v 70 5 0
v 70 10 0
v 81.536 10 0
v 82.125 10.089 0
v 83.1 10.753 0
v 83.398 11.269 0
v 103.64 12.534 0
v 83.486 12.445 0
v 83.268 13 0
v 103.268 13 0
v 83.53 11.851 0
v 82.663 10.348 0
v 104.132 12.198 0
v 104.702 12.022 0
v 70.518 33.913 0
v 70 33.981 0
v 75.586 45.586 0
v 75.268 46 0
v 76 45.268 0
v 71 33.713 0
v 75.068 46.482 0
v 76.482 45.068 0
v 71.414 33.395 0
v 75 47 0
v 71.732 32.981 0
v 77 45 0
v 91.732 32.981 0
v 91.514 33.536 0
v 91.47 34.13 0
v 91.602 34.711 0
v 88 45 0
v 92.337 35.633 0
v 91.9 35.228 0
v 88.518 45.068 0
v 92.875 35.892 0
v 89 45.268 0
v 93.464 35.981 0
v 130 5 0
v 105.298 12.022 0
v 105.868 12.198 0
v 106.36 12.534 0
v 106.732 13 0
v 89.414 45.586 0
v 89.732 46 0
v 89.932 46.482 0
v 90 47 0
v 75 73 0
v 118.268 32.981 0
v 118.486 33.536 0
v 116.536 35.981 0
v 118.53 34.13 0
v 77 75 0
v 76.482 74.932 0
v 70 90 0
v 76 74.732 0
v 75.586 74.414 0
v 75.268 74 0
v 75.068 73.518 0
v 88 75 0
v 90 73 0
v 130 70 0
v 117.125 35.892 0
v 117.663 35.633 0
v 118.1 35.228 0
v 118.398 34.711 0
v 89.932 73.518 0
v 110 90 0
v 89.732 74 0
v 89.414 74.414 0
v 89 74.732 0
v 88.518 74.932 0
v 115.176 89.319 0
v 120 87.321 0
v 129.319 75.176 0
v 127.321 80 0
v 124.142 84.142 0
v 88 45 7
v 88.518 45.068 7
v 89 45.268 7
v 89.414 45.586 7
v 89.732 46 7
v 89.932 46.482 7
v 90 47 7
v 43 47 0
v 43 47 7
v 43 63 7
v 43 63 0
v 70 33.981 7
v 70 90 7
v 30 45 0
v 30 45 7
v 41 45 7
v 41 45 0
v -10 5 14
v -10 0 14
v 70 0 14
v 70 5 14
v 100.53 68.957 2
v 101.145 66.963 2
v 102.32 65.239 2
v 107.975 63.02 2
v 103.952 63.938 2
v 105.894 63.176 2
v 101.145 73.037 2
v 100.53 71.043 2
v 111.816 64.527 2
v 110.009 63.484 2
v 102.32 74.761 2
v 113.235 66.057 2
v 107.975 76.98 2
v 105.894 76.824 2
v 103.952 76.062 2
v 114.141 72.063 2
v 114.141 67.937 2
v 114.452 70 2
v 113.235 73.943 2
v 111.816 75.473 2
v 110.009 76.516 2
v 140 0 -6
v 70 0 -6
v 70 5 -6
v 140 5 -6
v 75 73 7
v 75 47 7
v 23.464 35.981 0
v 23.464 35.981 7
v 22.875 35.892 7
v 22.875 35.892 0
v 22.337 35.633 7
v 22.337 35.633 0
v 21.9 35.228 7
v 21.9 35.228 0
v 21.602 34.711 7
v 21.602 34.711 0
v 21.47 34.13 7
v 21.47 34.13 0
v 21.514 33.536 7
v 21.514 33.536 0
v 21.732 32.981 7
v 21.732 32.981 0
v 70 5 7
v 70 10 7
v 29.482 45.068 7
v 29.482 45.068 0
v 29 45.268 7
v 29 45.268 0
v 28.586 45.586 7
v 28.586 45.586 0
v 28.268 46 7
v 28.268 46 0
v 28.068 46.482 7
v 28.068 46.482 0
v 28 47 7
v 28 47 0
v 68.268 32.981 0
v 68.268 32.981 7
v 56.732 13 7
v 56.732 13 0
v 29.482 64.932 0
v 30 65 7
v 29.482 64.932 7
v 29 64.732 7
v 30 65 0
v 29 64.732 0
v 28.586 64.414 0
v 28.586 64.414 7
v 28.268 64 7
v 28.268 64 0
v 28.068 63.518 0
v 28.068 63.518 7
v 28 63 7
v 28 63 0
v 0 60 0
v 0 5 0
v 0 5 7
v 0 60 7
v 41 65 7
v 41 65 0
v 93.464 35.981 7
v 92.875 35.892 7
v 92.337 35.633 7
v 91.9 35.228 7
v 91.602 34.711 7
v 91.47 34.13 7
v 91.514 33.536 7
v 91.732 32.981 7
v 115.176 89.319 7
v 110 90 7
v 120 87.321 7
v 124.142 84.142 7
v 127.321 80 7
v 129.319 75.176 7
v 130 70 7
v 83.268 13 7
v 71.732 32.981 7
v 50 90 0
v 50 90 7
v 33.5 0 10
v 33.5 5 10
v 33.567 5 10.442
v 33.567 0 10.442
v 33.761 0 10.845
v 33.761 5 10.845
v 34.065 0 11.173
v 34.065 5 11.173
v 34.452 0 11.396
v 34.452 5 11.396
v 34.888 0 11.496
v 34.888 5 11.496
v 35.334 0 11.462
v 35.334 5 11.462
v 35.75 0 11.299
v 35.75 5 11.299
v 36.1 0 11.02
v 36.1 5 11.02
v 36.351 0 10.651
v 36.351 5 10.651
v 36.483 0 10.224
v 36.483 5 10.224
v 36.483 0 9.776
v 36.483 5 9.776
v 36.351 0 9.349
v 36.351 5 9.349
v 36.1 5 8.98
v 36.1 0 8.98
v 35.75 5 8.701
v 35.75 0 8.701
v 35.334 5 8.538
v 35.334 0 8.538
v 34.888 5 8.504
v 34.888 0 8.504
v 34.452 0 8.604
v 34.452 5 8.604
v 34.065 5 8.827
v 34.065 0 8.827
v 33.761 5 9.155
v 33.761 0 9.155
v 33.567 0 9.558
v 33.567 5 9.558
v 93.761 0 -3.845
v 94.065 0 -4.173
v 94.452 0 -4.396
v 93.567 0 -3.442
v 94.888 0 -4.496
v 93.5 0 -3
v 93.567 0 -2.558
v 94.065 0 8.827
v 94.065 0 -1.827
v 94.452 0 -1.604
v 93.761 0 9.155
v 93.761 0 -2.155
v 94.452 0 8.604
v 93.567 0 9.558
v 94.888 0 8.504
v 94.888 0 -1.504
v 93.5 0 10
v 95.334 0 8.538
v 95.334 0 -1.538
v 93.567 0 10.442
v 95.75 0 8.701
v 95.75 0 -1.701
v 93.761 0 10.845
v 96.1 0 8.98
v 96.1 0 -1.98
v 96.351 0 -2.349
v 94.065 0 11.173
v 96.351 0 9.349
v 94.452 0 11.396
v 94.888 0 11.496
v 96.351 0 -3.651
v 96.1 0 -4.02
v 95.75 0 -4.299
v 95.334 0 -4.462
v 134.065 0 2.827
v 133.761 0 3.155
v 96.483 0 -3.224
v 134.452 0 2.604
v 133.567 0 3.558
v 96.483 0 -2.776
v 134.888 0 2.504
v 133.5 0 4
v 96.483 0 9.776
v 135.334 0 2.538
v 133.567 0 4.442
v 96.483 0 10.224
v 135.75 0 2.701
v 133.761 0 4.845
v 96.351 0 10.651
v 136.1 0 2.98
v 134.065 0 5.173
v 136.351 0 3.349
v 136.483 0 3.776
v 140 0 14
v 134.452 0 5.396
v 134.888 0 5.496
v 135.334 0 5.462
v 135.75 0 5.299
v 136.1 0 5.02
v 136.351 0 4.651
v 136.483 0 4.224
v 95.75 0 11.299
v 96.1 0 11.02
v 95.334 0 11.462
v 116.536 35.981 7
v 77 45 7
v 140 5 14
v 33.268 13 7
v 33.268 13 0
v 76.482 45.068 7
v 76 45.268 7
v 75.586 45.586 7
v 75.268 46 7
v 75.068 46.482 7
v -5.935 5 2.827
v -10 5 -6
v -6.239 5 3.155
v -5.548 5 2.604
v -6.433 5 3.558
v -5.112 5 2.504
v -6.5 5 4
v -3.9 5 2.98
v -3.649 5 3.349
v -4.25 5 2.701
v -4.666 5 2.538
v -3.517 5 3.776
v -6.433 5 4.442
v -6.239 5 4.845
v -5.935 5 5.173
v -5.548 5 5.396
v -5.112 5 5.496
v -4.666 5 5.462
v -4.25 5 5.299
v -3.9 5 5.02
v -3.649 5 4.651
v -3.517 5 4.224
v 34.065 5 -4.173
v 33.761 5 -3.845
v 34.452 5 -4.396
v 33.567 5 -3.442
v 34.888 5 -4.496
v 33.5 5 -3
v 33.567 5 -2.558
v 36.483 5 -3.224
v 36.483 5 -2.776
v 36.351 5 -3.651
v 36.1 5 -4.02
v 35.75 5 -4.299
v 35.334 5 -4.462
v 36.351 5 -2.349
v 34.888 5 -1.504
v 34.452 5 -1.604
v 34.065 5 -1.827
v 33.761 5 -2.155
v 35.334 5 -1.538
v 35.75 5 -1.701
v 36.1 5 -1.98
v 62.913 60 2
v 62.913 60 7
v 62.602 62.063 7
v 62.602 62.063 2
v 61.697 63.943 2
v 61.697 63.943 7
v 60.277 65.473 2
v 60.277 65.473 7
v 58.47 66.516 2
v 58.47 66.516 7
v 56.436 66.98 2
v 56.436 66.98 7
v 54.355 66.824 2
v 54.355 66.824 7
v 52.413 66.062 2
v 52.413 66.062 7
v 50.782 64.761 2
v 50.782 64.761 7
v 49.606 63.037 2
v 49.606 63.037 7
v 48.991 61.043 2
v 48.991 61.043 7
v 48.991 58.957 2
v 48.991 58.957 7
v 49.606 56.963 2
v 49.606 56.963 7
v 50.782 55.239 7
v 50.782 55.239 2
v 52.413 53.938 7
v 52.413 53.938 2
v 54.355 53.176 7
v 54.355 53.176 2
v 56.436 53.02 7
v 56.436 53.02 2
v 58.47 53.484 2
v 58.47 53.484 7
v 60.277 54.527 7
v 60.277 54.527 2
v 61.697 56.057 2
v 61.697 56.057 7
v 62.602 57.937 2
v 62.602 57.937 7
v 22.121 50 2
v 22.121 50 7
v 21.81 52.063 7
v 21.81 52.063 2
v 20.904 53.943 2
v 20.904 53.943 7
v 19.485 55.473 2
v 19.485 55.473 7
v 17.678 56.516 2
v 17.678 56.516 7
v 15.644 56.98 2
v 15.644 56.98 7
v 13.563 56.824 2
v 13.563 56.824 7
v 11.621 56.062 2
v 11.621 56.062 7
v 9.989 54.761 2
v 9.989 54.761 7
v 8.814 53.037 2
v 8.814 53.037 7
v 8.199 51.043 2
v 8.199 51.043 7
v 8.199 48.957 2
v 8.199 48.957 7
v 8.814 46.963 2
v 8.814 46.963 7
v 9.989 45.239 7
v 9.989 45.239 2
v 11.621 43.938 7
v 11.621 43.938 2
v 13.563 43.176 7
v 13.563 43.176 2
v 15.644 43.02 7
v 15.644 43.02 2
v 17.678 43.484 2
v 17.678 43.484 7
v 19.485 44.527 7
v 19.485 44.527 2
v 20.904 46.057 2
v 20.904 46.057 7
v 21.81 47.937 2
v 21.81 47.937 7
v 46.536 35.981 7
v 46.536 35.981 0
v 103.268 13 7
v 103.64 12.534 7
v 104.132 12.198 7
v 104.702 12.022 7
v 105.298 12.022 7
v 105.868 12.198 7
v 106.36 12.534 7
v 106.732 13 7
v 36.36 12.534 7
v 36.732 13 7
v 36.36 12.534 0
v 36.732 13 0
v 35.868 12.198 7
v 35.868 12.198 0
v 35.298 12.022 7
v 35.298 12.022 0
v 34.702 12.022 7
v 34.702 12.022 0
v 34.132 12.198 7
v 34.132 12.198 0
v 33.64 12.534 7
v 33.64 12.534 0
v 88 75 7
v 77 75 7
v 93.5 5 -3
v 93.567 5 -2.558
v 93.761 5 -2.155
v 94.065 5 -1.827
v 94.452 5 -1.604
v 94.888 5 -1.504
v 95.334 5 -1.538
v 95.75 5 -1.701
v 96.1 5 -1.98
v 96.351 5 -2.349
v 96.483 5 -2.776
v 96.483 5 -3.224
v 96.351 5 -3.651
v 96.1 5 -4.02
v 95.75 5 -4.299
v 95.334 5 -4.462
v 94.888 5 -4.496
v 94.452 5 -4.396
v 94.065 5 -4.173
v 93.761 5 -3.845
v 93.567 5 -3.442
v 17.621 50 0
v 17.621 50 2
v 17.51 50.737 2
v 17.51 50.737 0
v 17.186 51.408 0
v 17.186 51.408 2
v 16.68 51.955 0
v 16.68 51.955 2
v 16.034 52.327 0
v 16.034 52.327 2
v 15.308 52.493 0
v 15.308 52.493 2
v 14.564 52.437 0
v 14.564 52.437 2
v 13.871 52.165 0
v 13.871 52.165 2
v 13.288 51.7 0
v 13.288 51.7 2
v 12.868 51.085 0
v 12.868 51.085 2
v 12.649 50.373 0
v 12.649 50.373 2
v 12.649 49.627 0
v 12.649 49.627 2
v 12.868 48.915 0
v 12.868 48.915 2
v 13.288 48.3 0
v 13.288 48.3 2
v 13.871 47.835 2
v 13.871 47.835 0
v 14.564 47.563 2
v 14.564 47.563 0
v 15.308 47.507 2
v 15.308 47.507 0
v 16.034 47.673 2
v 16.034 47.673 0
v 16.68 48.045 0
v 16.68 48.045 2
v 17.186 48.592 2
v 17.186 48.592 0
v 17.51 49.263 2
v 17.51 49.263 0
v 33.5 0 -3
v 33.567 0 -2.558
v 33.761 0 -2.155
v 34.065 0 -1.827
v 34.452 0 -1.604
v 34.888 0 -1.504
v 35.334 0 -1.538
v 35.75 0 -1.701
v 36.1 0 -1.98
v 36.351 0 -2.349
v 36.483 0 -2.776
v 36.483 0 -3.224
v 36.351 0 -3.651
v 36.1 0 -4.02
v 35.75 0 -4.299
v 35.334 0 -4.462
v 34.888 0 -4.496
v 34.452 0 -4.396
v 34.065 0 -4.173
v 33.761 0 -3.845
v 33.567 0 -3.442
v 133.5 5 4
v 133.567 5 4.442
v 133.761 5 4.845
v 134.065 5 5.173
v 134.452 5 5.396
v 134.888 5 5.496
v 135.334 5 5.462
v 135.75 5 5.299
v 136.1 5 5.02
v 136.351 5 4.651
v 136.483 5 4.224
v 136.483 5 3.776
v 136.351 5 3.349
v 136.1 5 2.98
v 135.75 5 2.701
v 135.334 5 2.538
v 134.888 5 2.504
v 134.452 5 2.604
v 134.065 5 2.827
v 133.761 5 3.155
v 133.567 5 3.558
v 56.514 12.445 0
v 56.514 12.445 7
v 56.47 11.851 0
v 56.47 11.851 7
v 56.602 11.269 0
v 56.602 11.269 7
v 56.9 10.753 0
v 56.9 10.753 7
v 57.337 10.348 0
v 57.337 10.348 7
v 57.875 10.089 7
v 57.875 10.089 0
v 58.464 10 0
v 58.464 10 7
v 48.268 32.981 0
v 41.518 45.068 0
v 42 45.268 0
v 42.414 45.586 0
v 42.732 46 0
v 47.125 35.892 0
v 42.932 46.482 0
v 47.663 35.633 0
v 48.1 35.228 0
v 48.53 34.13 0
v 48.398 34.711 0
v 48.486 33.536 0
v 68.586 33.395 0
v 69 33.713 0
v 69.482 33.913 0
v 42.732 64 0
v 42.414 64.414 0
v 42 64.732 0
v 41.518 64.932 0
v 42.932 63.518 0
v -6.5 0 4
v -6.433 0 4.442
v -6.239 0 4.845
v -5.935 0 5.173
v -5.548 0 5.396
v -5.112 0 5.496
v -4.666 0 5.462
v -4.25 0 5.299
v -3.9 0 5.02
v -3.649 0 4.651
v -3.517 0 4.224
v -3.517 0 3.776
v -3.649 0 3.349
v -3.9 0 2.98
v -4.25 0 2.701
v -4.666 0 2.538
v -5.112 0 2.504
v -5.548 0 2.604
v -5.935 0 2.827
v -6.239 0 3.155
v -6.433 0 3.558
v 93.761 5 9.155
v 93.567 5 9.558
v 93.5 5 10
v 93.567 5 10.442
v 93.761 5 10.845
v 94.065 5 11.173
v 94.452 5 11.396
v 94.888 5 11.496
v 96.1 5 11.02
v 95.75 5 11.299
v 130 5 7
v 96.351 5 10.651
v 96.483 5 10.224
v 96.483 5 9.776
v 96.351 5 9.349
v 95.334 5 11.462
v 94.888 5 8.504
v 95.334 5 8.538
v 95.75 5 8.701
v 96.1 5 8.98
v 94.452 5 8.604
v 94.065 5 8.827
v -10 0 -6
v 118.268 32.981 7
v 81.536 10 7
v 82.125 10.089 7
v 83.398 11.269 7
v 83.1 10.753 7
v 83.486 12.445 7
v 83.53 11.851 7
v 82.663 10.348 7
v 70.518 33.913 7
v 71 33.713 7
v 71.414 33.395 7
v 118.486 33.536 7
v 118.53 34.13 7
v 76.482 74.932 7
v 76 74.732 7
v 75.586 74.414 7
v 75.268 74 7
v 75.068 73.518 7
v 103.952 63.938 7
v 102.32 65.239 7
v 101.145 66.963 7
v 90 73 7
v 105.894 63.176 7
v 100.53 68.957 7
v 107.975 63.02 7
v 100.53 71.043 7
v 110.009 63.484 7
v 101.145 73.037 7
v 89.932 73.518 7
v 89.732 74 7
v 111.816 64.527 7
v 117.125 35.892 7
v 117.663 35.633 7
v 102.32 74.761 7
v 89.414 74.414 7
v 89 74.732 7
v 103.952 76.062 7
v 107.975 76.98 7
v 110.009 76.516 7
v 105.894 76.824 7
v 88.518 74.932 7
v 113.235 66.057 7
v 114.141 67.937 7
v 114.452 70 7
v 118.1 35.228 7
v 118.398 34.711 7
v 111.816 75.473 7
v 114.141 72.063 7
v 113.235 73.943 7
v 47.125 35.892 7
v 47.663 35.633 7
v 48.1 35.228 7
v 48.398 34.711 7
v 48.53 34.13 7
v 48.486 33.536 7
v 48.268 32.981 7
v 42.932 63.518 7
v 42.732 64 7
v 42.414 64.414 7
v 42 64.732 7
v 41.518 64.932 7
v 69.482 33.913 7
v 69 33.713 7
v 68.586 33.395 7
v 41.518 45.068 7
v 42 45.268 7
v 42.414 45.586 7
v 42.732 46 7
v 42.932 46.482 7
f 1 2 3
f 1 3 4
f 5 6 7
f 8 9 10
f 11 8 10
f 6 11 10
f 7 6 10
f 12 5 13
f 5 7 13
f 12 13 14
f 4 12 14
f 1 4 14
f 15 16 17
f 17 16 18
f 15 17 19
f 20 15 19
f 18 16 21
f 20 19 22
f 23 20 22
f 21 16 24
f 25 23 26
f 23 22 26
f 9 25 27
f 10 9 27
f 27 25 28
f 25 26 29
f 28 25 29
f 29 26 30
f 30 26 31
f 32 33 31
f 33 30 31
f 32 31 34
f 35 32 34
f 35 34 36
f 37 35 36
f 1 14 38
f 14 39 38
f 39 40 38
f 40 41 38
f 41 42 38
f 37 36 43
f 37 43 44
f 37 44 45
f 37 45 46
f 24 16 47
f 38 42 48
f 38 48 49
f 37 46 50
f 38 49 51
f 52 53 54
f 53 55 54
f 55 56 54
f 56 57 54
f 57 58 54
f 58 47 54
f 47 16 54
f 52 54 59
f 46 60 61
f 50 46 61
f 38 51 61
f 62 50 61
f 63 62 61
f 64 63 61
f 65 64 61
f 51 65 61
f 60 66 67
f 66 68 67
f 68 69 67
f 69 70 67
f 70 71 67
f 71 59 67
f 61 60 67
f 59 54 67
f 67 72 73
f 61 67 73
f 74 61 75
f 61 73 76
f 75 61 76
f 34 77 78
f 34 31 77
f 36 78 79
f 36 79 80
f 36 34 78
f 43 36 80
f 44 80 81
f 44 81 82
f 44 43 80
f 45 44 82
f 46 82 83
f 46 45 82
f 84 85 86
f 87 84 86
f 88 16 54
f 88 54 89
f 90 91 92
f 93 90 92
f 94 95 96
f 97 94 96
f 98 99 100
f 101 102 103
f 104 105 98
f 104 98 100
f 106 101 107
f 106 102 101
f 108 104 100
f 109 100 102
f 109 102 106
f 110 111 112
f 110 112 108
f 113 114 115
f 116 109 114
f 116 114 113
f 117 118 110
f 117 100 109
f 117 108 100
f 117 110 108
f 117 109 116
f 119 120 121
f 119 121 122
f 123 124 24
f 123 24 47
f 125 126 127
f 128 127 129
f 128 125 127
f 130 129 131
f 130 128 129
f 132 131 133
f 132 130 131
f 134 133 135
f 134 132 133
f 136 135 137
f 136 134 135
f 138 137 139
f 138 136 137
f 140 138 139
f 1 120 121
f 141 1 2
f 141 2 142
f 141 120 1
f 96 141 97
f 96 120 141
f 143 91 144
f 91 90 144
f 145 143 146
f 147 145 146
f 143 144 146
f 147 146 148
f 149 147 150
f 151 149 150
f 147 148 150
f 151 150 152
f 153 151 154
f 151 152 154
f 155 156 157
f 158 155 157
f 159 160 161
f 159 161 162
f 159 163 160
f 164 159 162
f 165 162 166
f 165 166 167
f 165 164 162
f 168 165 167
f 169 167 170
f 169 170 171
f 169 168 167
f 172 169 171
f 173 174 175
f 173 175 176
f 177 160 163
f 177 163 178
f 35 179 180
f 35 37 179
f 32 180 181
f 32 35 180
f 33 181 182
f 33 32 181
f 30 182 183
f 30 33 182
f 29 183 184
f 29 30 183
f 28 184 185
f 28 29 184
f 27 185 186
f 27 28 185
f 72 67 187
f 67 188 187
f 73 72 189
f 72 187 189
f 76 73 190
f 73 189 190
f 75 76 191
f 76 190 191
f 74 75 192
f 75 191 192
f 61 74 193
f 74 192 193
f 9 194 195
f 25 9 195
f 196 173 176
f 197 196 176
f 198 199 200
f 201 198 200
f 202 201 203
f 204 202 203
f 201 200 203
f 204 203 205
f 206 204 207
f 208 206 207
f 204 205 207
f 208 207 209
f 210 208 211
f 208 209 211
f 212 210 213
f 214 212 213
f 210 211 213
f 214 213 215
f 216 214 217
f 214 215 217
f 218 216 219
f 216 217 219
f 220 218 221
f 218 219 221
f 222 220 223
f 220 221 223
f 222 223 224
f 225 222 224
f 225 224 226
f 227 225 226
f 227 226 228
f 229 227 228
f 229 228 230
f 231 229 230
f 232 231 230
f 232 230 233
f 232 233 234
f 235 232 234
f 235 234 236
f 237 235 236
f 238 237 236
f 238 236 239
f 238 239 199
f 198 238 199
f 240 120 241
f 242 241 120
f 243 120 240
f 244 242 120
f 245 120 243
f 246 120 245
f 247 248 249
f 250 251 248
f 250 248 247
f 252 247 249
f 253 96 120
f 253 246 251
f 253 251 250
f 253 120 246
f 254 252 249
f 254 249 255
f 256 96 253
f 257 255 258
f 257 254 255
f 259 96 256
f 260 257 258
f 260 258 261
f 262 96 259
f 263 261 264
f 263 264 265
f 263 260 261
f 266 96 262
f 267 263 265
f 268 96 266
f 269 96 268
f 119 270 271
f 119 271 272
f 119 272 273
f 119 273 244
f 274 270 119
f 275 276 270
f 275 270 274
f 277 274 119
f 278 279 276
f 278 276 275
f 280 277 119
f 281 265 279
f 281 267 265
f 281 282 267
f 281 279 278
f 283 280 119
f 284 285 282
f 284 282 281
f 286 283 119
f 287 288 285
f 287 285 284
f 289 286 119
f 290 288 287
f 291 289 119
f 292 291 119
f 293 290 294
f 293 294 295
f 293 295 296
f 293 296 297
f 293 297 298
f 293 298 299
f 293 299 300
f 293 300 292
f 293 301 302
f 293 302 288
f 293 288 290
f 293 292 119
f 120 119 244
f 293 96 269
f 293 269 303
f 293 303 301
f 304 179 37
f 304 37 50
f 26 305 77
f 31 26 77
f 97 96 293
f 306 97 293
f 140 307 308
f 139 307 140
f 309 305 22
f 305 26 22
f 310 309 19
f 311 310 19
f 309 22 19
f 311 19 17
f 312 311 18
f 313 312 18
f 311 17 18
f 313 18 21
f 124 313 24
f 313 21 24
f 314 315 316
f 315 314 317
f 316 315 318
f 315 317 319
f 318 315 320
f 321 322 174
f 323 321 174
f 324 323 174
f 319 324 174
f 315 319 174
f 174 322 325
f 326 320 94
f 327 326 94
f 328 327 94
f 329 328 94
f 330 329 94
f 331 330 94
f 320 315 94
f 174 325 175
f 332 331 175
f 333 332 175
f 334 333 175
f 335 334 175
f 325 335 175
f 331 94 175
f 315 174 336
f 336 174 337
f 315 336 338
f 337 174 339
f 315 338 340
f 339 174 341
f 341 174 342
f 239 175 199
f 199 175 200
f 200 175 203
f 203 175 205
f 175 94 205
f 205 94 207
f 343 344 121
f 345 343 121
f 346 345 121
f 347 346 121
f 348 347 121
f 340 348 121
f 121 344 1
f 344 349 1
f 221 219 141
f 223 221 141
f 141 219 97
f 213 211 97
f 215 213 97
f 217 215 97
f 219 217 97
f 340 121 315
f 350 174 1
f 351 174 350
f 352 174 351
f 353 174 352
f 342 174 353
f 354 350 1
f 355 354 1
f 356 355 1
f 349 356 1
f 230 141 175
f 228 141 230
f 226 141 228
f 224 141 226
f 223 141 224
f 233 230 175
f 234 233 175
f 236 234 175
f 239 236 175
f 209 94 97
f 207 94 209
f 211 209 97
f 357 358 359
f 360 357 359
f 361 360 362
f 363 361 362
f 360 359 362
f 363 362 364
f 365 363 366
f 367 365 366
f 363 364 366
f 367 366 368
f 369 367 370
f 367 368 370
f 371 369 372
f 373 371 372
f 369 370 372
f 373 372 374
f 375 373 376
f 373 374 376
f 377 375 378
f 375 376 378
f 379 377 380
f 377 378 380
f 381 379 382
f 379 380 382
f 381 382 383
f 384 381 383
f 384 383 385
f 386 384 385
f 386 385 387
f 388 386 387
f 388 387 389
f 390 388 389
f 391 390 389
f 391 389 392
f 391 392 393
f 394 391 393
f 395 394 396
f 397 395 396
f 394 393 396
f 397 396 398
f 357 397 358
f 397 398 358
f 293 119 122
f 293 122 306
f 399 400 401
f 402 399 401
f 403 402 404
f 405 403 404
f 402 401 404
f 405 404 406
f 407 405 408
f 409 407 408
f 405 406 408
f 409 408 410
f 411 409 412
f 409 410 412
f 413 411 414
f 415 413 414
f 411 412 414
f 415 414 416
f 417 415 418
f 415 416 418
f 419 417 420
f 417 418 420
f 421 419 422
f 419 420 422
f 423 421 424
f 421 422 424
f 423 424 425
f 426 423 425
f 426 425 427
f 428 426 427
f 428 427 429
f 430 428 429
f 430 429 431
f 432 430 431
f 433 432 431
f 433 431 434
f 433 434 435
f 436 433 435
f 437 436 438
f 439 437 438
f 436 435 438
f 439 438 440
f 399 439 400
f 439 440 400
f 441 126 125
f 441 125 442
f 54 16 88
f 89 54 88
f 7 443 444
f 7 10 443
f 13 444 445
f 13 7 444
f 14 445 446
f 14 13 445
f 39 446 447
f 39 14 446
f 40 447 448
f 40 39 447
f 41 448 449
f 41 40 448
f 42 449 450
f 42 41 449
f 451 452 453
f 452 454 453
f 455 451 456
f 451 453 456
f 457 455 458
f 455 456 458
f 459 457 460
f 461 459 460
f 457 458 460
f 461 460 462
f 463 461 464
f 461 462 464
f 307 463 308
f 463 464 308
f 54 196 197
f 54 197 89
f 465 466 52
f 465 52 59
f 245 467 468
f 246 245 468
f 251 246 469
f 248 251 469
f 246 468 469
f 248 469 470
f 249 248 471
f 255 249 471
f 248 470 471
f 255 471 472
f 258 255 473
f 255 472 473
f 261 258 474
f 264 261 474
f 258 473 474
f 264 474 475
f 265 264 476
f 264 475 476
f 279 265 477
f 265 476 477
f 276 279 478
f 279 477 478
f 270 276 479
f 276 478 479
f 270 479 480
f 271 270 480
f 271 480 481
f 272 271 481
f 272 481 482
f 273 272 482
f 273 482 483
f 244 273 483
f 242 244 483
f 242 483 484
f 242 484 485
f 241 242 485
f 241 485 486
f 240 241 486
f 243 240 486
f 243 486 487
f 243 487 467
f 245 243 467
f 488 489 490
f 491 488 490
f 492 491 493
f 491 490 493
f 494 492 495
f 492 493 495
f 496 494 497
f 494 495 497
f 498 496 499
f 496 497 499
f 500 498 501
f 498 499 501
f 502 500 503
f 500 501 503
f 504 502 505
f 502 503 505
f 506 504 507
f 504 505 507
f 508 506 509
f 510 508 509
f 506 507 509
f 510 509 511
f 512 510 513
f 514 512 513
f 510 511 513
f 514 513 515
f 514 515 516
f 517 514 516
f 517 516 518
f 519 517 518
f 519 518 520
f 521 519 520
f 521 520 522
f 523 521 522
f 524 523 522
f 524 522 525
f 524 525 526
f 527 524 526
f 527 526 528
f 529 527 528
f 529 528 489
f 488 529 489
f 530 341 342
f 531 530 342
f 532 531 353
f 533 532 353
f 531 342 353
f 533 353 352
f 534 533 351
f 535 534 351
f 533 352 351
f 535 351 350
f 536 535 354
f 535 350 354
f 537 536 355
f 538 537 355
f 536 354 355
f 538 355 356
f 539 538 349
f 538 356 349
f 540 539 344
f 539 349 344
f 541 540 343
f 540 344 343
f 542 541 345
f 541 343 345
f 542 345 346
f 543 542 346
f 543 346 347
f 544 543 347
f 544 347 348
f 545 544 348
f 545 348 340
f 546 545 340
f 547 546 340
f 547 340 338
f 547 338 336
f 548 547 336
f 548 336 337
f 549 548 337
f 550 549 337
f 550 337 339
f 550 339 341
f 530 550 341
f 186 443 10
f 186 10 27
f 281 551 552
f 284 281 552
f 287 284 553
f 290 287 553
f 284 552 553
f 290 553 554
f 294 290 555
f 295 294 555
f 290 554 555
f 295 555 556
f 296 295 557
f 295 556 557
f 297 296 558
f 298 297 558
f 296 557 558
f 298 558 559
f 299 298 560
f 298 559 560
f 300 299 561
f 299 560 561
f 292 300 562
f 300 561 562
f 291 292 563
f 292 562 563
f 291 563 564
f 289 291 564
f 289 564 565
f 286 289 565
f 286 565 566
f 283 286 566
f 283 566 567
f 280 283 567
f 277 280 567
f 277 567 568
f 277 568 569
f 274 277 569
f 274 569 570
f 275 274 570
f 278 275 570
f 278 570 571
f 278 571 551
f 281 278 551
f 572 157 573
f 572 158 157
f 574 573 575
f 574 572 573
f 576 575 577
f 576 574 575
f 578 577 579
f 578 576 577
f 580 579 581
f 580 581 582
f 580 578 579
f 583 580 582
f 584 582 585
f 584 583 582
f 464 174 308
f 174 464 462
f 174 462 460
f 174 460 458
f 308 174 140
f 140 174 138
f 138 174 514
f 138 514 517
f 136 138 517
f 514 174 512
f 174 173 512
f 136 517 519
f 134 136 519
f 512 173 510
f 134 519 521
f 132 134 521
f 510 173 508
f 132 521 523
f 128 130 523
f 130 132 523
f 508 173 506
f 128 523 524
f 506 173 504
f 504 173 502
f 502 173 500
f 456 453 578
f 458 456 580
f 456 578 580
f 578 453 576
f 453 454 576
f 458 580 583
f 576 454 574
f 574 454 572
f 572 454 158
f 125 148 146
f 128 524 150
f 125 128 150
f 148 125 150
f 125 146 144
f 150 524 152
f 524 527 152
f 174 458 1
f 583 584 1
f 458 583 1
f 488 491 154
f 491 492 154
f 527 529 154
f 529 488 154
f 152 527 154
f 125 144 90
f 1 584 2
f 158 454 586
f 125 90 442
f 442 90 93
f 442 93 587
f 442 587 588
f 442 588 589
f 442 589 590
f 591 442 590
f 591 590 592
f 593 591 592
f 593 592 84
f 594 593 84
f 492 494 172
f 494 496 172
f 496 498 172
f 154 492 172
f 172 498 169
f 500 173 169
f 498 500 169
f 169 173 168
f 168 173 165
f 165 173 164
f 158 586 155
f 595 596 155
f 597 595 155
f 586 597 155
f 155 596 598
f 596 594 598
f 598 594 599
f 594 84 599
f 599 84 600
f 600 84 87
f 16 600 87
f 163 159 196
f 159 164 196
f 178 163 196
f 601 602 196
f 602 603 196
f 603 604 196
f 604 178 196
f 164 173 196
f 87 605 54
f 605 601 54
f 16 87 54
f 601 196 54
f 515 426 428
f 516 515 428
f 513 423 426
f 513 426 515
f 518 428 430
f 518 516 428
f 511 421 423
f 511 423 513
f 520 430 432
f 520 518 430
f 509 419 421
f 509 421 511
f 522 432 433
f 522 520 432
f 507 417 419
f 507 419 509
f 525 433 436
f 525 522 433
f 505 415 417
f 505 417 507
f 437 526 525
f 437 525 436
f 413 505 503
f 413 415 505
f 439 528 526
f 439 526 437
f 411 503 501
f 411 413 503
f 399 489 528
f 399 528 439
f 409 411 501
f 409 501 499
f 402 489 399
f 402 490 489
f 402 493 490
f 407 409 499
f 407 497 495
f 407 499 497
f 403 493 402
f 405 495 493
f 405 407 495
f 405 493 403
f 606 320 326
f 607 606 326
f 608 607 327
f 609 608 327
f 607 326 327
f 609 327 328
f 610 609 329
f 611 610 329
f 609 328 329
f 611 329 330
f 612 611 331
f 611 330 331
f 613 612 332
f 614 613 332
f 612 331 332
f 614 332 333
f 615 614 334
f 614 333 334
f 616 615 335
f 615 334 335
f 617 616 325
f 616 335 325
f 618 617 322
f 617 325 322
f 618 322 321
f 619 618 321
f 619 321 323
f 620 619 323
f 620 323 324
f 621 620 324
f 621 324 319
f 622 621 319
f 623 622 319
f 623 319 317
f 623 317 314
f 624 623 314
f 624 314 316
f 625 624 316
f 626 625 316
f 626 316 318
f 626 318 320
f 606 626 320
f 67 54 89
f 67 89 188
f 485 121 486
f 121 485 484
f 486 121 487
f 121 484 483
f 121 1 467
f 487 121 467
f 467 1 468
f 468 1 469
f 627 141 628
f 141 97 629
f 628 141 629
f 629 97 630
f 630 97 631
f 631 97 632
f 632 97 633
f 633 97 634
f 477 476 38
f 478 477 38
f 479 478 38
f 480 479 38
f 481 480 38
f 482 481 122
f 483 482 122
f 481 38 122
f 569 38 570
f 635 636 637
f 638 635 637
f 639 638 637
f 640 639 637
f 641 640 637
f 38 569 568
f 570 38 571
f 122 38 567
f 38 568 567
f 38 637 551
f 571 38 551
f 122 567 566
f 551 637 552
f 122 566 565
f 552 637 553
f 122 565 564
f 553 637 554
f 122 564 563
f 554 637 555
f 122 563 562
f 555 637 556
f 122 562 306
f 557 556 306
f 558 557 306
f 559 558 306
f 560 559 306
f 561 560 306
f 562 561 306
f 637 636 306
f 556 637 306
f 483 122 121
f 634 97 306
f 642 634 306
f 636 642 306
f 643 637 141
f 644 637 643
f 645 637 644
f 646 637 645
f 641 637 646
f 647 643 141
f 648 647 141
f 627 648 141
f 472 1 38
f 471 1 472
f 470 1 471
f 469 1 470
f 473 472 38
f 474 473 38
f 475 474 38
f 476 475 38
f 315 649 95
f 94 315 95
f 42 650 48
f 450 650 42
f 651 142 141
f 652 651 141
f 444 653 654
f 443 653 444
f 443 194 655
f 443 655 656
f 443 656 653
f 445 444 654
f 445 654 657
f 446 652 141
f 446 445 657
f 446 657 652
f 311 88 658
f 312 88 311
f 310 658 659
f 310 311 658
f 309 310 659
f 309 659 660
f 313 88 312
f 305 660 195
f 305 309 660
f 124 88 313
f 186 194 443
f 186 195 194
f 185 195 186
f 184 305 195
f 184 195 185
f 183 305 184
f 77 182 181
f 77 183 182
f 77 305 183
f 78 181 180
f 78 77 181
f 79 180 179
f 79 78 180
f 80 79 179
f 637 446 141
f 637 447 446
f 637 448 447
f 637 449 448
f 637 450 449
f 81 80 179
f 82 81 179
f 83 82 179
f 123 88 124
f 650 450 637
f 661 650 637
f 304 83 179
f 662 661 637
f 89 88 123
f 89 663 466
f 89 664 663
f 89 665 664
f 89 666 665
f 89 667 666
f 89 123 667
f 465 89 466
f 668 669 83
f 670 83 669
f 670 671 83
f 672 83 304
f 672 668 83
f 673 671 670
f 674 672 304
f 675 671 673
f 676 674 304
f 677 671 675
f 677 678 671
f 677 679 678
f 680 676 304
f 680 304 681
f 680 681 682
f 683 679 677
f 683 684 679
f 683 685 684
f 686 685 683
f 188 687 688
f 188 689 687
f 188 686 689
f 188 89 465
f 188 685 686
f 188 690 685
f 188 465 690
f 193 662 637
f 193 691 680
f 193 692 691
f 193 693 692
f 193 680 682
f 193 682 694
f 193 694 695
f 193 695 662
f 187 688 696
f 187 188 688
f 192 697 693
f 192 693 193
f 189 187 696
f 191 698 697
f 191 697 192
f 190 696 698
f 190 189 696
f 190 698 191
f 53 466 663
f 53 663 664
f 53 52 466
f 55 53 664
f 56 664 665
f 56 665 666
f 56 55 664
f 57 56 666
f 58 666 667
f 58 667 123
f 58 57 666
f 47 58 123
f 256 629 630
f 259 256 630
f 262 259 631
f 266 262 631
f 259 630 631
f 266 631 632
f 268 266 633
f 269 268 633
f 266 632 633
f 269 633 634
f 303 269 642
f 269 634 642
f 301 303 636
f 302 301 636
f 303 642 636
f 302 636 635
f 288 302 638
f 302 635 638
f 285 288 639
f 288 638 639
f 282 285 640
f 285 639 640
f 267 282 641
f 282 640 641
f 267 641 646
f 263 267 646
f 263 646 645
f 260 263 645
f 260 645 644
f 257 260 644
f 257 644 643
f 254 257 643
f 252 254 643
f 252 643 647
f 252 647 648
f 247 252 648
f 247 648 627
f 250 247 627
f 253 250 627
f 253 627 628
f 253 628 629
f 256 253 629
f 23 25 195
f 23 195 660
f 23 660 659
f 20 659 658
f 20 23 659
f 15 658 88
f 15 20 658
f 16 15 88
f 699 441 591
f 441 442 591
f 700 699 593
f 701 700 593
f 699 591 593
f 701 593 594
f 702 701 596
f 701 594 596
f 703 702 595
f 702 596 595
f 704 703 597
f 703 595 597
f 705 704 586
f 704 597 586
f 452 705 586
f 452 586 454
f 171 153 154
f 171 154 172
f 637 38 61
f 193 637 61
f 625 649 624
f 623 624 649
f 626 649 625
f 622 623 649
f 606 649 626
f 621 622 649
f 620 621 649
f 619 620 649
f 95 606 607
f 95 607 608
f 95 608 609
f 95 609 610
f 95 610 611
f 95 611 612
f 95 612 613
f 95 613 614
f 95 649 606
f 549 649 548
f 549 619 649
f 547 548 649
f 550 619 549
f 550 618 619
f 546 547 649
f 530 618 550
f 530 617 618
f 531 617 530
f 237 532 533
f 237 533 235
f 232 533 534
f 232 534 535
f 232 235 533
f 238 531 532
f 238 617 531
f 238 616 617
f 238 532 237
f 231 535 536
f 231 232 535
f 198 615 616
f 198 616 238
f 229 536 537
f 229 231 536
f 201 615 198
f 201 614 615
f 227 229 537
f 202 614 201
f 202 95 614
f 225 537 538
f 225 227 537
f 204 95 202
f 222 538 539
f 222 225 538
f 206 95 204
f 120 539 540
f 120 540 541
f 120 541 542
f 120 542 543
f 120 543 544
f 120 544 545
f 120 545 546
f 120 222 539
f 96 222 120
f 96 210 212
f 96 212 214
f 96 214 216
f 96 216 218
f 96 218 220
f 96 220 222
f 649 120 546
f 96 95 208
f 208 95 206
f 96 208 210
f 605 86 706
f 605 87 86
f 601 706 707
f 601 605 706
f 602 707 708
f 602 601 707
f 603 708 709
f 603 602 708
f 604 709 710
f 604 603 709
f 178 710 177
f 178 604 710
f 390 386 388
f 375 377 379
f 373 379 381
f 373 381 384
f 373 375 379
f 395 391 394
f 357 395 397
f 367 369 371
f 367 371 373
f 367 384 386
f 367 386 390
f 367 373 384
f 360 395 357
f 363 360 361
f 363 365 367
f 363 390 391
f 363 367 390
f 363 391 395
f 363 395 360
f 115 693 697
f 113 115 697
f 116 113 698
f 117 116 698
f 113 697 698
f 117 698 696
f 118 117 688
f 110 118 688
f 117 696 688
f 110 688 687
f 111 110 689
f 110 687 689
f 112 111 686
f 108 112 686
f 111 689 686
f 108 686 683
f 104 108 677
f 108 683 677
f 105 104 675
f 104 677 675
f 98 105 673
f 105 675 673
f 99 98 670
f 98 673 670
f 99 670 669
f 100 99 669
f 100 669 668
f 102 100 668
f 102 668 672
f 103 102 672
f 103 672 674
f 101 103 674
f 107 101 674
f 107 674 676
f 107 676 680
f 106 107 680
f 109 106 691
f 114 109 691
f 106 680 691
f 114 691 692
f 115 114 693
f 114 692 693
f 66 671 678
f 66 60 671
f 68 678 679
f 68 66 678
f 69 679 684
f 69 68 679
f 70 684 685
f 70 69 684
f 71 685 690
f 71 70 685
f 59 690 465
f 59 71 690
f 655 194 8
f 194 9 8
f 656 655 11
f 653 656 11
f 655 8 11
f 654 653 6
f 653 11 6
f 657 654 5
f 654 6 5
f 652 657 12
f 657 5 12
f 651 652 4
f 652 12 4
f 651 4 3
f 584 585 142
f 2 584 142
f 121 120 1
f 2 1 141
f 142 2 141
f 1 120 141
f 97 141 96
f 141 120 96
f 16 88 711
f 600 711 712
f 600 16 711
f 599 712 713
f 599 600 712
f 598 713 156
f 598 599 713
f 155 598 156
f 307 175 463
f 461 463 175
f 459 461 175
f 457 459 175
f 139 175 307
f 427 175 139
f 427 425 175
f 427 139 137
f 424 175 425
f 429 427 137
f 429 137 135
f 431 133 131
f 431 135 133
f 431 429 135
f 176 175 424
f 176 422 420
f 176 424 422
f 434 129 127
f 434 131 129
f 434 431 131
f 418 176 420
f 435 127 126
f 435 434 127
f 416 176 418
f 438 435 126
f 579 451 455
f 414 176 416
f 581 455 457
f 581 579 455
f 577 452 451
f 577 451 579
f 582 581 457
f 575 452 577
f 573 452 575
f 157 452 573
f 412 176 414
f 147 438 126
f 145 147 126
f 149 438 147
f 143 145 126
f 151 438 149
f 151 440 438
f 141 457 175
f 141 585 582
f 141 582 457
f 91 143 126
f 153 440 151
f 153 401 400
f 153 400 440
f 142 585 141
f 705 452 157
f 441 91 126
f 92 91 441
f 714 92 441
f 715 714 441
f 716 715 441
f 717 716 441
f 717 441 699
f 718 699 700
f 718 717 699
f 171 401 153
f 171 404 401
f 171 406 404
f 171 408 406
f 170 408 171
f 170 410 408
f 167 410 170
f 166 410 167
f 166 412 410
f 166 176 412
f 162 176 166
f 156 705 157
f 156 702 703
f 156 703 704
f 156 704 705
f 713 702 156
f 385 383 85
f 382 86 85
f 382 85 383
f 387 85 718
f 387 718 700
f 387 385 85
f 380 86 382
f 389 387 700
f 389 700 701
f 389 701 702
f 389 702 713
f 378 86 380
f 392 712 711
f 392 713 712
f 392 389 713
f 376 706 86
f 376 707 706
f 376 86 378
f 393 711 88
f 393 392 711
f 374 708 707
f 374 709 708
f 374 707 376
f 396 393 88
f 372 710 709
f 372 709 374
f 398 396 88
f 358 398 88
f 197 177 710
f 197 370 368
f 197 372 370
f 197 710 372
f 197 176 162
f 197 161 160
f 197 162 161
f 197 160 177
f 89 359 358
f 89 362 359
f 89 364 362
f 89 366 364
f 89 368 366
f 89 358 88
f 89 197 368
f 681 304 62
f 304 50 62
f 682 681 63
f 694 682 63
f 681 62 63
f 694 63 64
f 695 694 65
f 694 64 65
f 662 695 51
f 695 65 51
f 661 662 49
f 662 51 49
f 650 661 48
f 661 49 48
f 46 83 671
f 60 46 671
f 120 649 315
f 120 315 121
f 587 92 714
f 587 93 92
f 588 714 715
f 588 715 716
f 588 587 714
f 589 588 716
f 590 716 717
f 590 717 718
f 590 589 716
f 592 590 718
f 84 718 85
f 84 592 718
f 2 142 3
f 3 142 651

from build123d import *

# Parameters (mm, degrees)
SKETCH_3_W              = 130
SKETCH_3_H              = 90
EXTRUDE_2_DEPTH         = 7
HOLE_WIZARD_14_0_14_1_D = 5
SKETCH_22_R             = 7
CUT_EXTRUDE_4_DEPTH     = 5
CHAMFER_2_SIZE          = 50
CHAMFER_2_SIZE2         = 30
FILLET_3_R              = 20
SKETCH_25_W             = 150
SKETCH_25_H             = 20
EXTRUDE_3_DEPTH         = 5
SKETCH_26_R             = 1.5
CUT_EXTRUDE_5_DEPTH     = 165.380655796
CUT_EXTRUDE_6_REACH     = 168.94
FILLET_4_R              = 2
SKETCH_28_W             = 15
SKETCH_28_H             = 30
SKETCH_28_H_2           = 20
CUT_EXTRUDE_7_DEPTH     = 167.940109021
FILLET_5_R              = 2


with BuildPart() as part:
    # 草图3 → 凸台-拉伸2 (new body)
    with BuildSketch(Plane.XY):
        with Locations((65, 45)):
            Rectangle(SKETCH_3_W, SKETCH_3_H)
    extrude(amount=EXTRUDE_2_DEPTH)

    # Ø14.0 (14) 直径孔1 (through all)
    with Locations(Plane(origin=(0, 0, 0), x_dir=(-1, 0, 0), z_dir=(0, 0, -1))):
        with Locations((-15.120799087, 50)):
            Hole(HOLE_WIZARD_14_0_14_1_D / 2)

    # 草图22 → 切除-拉伸4 (cut)
    with BuildSketch(Plane.XY.offset(7)):
        with Locations((15.120799087, 50)):
            Circle(SKETCH_22_R)
        with Locations((55.912955196, 60)):
            Circle(SKETCH_22_R)
        with Locations((107.451775516, 70)):
            Circle(SKETCH_22_R)
    extrude(amount=-CUT_EXTRUDE_4_DEPTH, mode=Mode.SUBTRACT)

    # 倒角2
    chamfer_2_edges = [part.edges().sort_by_distance(p)[0] for p in [
        (0, 90, 3.5),
    ]]
    chamfer_2_side = [part.faces().sort_by_distance(p)[0] for p in [
        (65, 90, 3.5),
    ]]
    chamfer(chamfer_2_edges, length=CHAMFER_2_SIZE, length2=CHAMFER_2_SIZE2, reference=chamfer_2_side[0])

    # 圆角3
    fillet_3_edges = [part.edges().sort_by_distance(p)[0] for p in [
        (130, 90, 3.5),
    ]]
    fillet(fillet_3_edges, radius=FILLET_3_R)

    # 草图25 → 凸台-拉伸3 (add)
    with BuildSketch(Plane.XZ):
        with Locations((65, 4)):
            Rectangle(SKETCH_25_W, SKETCH_25_H)
    extrude(amount=-EXTRUDE_3_DEPTH)

    # 草图26 → 切除-拉伸5 (cut, through all)
    with BuildSketch(Plane(origin=(0, 5, 0), x_dir=(1, 0, 0), z_dir=(0, 1, 0))):
        with Locations(Location((-5, -4, 0), (0, 0, 180))):
            Circle(SKETCH_26_R)
        with Locations(Location((135, -4, 0), (0, 0, 180))):
            Circle(SKETCH_26_R)
        with Locations(Location((35, -10, 0), (0, 0, 180))):
            Circle(SKETCH_26_R)
        with Locations(Location((95, -10, 0), (0, 0, 180))):
            Circle(SKETCH_26_R)
        with Locations(Location((95, 3, 0), (0, 0, 180))):
            Circle(SKETCH_26_R)
        with Locations(Location((35, 3, 0), (0, 0, 180))):
            Circle(SKETCH_26_R)
    extrude(amount=-CUT_EXTRUDE_5_DEPTH, mode=Mode.SUBTRACT)

    # 草图27 → 切除-拉伸6 (cut, up to next)
    with BuildSketch(Plane.XY.offset(7), mode=Mode.PRIVATE) as cut_extrude_6_sk1:
        Polygon((20, 35.980762114), (50, 35.980762114), (35, 10), align=None)
    cut_extrude_6_tool1 = extrude(cut_extrude_6_sk1.sketch, amount=-CUT_EXTRUDE_6_REACH, mode=Mode.PRIVATE) & part.part
    # 草图27 → 切除-拉伸6 (cut, up to next)
    with BuildSketch(Plane.XY.offset(7), mode=Mode.PRIVATE) as cut_extrude_6_sk2:
        Polygon((55, 10), (85, 10), (70, 35.980762114), align=None)
    cut_extrude_6_tool2 = extrude(cut_extrude_6_sk2.sketch, amount=-CUT_EXTRUDE_6_REACH, mode=Mode.PRIVATE) & part.part
    # 草图27 → 切除-拉伸6 (cut, up to next)
    with BuildSketch(Plane.XY.offset(7), mode=Mode.PRIVATE) as cut_extrude_6_sk3:
        Polygon((90, 35.980762114), (120, 35.980762114), (105, 10), align=None)
    cut_extrude_6_tool3 = extrude(cut_extrude_6_sk3.sketch, amount=-CUT_EXTRUDE_6_REACH, mode=Mode.PRIVATE) & part.part
    add(cut_extrude_6_tool1.solids().sort_by_distance((35, 27.320508, 7))[0], mode=Mode.SUBTRACT)
    add(cut_extrude_6_tool2.solids().sort_by_distance((70, 18.660254, 7))[0], mode=Mode.SUBTRACT)
    add(cut_extrude_6_tool3.solids().sort_by_distance((105, 27.320508, 7))[0], mode=Mode.SUBTRACT)

    # 圆角4
    fillet_4_edges = [part.edges().sort_by_distance(p)[0] for p in [
        (35, 10, 3.5),
        (20, 35.980762114, 3.5),
        (50, 35.980762114, 3.5),
        (55, 10, 3.5),
        (70, 35.980762114, 3.5),
        (85, 10, 3.5),
        (105, 10, 3.5),
        (90, 35.980762114, 3.5),
        (120, 35.980762114, 3.5),
    ]]
    fillet(fillet_4_edges, radius=FILLET_4_R)

    # 草图28 → 切除-拉伸7 (cut, through all)
    with BuildSketch(Plane.XY.offset(7)):
        with Locations((82.5, 60)):
            Rectangle(SKETCH_28_W, SKETCH_28_H)
        with Locations((35.5, 55)):
            Rectangle(SKETCH_28_W, SKETCH_28_H_2)
    extrude(amount=-CUT_EXTRUDE_7_DEPTH, mode=Mode.SUBTRACT)

    # 圆角5
    fillet_5_edges = [part.edges().sort_by_distance(p)[0] for p in [
        (75, 45, 3.5),
        (75, 75, 3.5),
        (90, 75, 3.5),
        (90, 45, 3.5),
        (28, 45, 3.5),
        (28, 65, 3.5),
        (43, 65, 3.5),
        (43, 45, 3.5),
    ]]
    fillet(fillet_5_edges, radius=FILLET_5_R)


with BuildPart() as body_2:
    # Split Bodies 1: the piece on the far side of the plane
    add(part.part)
    split(bisect_by=Plane(origin=(70, 0, 0), x_dir=(0, 0, 1), z_dir=(1, 0, 0)), keep=Keep.BOTTOM)


with BuildPart() as part_1:
    add(part.part)

    # Split Bodies 1
    split(bisect_by=Plane(origin=(70, 0, 0), x_dir=(0, 0, 1), z_dir=(1, 0, 0)), keep=Keep.TOP)


solid = Compound([body_2.part, part_1.part])
